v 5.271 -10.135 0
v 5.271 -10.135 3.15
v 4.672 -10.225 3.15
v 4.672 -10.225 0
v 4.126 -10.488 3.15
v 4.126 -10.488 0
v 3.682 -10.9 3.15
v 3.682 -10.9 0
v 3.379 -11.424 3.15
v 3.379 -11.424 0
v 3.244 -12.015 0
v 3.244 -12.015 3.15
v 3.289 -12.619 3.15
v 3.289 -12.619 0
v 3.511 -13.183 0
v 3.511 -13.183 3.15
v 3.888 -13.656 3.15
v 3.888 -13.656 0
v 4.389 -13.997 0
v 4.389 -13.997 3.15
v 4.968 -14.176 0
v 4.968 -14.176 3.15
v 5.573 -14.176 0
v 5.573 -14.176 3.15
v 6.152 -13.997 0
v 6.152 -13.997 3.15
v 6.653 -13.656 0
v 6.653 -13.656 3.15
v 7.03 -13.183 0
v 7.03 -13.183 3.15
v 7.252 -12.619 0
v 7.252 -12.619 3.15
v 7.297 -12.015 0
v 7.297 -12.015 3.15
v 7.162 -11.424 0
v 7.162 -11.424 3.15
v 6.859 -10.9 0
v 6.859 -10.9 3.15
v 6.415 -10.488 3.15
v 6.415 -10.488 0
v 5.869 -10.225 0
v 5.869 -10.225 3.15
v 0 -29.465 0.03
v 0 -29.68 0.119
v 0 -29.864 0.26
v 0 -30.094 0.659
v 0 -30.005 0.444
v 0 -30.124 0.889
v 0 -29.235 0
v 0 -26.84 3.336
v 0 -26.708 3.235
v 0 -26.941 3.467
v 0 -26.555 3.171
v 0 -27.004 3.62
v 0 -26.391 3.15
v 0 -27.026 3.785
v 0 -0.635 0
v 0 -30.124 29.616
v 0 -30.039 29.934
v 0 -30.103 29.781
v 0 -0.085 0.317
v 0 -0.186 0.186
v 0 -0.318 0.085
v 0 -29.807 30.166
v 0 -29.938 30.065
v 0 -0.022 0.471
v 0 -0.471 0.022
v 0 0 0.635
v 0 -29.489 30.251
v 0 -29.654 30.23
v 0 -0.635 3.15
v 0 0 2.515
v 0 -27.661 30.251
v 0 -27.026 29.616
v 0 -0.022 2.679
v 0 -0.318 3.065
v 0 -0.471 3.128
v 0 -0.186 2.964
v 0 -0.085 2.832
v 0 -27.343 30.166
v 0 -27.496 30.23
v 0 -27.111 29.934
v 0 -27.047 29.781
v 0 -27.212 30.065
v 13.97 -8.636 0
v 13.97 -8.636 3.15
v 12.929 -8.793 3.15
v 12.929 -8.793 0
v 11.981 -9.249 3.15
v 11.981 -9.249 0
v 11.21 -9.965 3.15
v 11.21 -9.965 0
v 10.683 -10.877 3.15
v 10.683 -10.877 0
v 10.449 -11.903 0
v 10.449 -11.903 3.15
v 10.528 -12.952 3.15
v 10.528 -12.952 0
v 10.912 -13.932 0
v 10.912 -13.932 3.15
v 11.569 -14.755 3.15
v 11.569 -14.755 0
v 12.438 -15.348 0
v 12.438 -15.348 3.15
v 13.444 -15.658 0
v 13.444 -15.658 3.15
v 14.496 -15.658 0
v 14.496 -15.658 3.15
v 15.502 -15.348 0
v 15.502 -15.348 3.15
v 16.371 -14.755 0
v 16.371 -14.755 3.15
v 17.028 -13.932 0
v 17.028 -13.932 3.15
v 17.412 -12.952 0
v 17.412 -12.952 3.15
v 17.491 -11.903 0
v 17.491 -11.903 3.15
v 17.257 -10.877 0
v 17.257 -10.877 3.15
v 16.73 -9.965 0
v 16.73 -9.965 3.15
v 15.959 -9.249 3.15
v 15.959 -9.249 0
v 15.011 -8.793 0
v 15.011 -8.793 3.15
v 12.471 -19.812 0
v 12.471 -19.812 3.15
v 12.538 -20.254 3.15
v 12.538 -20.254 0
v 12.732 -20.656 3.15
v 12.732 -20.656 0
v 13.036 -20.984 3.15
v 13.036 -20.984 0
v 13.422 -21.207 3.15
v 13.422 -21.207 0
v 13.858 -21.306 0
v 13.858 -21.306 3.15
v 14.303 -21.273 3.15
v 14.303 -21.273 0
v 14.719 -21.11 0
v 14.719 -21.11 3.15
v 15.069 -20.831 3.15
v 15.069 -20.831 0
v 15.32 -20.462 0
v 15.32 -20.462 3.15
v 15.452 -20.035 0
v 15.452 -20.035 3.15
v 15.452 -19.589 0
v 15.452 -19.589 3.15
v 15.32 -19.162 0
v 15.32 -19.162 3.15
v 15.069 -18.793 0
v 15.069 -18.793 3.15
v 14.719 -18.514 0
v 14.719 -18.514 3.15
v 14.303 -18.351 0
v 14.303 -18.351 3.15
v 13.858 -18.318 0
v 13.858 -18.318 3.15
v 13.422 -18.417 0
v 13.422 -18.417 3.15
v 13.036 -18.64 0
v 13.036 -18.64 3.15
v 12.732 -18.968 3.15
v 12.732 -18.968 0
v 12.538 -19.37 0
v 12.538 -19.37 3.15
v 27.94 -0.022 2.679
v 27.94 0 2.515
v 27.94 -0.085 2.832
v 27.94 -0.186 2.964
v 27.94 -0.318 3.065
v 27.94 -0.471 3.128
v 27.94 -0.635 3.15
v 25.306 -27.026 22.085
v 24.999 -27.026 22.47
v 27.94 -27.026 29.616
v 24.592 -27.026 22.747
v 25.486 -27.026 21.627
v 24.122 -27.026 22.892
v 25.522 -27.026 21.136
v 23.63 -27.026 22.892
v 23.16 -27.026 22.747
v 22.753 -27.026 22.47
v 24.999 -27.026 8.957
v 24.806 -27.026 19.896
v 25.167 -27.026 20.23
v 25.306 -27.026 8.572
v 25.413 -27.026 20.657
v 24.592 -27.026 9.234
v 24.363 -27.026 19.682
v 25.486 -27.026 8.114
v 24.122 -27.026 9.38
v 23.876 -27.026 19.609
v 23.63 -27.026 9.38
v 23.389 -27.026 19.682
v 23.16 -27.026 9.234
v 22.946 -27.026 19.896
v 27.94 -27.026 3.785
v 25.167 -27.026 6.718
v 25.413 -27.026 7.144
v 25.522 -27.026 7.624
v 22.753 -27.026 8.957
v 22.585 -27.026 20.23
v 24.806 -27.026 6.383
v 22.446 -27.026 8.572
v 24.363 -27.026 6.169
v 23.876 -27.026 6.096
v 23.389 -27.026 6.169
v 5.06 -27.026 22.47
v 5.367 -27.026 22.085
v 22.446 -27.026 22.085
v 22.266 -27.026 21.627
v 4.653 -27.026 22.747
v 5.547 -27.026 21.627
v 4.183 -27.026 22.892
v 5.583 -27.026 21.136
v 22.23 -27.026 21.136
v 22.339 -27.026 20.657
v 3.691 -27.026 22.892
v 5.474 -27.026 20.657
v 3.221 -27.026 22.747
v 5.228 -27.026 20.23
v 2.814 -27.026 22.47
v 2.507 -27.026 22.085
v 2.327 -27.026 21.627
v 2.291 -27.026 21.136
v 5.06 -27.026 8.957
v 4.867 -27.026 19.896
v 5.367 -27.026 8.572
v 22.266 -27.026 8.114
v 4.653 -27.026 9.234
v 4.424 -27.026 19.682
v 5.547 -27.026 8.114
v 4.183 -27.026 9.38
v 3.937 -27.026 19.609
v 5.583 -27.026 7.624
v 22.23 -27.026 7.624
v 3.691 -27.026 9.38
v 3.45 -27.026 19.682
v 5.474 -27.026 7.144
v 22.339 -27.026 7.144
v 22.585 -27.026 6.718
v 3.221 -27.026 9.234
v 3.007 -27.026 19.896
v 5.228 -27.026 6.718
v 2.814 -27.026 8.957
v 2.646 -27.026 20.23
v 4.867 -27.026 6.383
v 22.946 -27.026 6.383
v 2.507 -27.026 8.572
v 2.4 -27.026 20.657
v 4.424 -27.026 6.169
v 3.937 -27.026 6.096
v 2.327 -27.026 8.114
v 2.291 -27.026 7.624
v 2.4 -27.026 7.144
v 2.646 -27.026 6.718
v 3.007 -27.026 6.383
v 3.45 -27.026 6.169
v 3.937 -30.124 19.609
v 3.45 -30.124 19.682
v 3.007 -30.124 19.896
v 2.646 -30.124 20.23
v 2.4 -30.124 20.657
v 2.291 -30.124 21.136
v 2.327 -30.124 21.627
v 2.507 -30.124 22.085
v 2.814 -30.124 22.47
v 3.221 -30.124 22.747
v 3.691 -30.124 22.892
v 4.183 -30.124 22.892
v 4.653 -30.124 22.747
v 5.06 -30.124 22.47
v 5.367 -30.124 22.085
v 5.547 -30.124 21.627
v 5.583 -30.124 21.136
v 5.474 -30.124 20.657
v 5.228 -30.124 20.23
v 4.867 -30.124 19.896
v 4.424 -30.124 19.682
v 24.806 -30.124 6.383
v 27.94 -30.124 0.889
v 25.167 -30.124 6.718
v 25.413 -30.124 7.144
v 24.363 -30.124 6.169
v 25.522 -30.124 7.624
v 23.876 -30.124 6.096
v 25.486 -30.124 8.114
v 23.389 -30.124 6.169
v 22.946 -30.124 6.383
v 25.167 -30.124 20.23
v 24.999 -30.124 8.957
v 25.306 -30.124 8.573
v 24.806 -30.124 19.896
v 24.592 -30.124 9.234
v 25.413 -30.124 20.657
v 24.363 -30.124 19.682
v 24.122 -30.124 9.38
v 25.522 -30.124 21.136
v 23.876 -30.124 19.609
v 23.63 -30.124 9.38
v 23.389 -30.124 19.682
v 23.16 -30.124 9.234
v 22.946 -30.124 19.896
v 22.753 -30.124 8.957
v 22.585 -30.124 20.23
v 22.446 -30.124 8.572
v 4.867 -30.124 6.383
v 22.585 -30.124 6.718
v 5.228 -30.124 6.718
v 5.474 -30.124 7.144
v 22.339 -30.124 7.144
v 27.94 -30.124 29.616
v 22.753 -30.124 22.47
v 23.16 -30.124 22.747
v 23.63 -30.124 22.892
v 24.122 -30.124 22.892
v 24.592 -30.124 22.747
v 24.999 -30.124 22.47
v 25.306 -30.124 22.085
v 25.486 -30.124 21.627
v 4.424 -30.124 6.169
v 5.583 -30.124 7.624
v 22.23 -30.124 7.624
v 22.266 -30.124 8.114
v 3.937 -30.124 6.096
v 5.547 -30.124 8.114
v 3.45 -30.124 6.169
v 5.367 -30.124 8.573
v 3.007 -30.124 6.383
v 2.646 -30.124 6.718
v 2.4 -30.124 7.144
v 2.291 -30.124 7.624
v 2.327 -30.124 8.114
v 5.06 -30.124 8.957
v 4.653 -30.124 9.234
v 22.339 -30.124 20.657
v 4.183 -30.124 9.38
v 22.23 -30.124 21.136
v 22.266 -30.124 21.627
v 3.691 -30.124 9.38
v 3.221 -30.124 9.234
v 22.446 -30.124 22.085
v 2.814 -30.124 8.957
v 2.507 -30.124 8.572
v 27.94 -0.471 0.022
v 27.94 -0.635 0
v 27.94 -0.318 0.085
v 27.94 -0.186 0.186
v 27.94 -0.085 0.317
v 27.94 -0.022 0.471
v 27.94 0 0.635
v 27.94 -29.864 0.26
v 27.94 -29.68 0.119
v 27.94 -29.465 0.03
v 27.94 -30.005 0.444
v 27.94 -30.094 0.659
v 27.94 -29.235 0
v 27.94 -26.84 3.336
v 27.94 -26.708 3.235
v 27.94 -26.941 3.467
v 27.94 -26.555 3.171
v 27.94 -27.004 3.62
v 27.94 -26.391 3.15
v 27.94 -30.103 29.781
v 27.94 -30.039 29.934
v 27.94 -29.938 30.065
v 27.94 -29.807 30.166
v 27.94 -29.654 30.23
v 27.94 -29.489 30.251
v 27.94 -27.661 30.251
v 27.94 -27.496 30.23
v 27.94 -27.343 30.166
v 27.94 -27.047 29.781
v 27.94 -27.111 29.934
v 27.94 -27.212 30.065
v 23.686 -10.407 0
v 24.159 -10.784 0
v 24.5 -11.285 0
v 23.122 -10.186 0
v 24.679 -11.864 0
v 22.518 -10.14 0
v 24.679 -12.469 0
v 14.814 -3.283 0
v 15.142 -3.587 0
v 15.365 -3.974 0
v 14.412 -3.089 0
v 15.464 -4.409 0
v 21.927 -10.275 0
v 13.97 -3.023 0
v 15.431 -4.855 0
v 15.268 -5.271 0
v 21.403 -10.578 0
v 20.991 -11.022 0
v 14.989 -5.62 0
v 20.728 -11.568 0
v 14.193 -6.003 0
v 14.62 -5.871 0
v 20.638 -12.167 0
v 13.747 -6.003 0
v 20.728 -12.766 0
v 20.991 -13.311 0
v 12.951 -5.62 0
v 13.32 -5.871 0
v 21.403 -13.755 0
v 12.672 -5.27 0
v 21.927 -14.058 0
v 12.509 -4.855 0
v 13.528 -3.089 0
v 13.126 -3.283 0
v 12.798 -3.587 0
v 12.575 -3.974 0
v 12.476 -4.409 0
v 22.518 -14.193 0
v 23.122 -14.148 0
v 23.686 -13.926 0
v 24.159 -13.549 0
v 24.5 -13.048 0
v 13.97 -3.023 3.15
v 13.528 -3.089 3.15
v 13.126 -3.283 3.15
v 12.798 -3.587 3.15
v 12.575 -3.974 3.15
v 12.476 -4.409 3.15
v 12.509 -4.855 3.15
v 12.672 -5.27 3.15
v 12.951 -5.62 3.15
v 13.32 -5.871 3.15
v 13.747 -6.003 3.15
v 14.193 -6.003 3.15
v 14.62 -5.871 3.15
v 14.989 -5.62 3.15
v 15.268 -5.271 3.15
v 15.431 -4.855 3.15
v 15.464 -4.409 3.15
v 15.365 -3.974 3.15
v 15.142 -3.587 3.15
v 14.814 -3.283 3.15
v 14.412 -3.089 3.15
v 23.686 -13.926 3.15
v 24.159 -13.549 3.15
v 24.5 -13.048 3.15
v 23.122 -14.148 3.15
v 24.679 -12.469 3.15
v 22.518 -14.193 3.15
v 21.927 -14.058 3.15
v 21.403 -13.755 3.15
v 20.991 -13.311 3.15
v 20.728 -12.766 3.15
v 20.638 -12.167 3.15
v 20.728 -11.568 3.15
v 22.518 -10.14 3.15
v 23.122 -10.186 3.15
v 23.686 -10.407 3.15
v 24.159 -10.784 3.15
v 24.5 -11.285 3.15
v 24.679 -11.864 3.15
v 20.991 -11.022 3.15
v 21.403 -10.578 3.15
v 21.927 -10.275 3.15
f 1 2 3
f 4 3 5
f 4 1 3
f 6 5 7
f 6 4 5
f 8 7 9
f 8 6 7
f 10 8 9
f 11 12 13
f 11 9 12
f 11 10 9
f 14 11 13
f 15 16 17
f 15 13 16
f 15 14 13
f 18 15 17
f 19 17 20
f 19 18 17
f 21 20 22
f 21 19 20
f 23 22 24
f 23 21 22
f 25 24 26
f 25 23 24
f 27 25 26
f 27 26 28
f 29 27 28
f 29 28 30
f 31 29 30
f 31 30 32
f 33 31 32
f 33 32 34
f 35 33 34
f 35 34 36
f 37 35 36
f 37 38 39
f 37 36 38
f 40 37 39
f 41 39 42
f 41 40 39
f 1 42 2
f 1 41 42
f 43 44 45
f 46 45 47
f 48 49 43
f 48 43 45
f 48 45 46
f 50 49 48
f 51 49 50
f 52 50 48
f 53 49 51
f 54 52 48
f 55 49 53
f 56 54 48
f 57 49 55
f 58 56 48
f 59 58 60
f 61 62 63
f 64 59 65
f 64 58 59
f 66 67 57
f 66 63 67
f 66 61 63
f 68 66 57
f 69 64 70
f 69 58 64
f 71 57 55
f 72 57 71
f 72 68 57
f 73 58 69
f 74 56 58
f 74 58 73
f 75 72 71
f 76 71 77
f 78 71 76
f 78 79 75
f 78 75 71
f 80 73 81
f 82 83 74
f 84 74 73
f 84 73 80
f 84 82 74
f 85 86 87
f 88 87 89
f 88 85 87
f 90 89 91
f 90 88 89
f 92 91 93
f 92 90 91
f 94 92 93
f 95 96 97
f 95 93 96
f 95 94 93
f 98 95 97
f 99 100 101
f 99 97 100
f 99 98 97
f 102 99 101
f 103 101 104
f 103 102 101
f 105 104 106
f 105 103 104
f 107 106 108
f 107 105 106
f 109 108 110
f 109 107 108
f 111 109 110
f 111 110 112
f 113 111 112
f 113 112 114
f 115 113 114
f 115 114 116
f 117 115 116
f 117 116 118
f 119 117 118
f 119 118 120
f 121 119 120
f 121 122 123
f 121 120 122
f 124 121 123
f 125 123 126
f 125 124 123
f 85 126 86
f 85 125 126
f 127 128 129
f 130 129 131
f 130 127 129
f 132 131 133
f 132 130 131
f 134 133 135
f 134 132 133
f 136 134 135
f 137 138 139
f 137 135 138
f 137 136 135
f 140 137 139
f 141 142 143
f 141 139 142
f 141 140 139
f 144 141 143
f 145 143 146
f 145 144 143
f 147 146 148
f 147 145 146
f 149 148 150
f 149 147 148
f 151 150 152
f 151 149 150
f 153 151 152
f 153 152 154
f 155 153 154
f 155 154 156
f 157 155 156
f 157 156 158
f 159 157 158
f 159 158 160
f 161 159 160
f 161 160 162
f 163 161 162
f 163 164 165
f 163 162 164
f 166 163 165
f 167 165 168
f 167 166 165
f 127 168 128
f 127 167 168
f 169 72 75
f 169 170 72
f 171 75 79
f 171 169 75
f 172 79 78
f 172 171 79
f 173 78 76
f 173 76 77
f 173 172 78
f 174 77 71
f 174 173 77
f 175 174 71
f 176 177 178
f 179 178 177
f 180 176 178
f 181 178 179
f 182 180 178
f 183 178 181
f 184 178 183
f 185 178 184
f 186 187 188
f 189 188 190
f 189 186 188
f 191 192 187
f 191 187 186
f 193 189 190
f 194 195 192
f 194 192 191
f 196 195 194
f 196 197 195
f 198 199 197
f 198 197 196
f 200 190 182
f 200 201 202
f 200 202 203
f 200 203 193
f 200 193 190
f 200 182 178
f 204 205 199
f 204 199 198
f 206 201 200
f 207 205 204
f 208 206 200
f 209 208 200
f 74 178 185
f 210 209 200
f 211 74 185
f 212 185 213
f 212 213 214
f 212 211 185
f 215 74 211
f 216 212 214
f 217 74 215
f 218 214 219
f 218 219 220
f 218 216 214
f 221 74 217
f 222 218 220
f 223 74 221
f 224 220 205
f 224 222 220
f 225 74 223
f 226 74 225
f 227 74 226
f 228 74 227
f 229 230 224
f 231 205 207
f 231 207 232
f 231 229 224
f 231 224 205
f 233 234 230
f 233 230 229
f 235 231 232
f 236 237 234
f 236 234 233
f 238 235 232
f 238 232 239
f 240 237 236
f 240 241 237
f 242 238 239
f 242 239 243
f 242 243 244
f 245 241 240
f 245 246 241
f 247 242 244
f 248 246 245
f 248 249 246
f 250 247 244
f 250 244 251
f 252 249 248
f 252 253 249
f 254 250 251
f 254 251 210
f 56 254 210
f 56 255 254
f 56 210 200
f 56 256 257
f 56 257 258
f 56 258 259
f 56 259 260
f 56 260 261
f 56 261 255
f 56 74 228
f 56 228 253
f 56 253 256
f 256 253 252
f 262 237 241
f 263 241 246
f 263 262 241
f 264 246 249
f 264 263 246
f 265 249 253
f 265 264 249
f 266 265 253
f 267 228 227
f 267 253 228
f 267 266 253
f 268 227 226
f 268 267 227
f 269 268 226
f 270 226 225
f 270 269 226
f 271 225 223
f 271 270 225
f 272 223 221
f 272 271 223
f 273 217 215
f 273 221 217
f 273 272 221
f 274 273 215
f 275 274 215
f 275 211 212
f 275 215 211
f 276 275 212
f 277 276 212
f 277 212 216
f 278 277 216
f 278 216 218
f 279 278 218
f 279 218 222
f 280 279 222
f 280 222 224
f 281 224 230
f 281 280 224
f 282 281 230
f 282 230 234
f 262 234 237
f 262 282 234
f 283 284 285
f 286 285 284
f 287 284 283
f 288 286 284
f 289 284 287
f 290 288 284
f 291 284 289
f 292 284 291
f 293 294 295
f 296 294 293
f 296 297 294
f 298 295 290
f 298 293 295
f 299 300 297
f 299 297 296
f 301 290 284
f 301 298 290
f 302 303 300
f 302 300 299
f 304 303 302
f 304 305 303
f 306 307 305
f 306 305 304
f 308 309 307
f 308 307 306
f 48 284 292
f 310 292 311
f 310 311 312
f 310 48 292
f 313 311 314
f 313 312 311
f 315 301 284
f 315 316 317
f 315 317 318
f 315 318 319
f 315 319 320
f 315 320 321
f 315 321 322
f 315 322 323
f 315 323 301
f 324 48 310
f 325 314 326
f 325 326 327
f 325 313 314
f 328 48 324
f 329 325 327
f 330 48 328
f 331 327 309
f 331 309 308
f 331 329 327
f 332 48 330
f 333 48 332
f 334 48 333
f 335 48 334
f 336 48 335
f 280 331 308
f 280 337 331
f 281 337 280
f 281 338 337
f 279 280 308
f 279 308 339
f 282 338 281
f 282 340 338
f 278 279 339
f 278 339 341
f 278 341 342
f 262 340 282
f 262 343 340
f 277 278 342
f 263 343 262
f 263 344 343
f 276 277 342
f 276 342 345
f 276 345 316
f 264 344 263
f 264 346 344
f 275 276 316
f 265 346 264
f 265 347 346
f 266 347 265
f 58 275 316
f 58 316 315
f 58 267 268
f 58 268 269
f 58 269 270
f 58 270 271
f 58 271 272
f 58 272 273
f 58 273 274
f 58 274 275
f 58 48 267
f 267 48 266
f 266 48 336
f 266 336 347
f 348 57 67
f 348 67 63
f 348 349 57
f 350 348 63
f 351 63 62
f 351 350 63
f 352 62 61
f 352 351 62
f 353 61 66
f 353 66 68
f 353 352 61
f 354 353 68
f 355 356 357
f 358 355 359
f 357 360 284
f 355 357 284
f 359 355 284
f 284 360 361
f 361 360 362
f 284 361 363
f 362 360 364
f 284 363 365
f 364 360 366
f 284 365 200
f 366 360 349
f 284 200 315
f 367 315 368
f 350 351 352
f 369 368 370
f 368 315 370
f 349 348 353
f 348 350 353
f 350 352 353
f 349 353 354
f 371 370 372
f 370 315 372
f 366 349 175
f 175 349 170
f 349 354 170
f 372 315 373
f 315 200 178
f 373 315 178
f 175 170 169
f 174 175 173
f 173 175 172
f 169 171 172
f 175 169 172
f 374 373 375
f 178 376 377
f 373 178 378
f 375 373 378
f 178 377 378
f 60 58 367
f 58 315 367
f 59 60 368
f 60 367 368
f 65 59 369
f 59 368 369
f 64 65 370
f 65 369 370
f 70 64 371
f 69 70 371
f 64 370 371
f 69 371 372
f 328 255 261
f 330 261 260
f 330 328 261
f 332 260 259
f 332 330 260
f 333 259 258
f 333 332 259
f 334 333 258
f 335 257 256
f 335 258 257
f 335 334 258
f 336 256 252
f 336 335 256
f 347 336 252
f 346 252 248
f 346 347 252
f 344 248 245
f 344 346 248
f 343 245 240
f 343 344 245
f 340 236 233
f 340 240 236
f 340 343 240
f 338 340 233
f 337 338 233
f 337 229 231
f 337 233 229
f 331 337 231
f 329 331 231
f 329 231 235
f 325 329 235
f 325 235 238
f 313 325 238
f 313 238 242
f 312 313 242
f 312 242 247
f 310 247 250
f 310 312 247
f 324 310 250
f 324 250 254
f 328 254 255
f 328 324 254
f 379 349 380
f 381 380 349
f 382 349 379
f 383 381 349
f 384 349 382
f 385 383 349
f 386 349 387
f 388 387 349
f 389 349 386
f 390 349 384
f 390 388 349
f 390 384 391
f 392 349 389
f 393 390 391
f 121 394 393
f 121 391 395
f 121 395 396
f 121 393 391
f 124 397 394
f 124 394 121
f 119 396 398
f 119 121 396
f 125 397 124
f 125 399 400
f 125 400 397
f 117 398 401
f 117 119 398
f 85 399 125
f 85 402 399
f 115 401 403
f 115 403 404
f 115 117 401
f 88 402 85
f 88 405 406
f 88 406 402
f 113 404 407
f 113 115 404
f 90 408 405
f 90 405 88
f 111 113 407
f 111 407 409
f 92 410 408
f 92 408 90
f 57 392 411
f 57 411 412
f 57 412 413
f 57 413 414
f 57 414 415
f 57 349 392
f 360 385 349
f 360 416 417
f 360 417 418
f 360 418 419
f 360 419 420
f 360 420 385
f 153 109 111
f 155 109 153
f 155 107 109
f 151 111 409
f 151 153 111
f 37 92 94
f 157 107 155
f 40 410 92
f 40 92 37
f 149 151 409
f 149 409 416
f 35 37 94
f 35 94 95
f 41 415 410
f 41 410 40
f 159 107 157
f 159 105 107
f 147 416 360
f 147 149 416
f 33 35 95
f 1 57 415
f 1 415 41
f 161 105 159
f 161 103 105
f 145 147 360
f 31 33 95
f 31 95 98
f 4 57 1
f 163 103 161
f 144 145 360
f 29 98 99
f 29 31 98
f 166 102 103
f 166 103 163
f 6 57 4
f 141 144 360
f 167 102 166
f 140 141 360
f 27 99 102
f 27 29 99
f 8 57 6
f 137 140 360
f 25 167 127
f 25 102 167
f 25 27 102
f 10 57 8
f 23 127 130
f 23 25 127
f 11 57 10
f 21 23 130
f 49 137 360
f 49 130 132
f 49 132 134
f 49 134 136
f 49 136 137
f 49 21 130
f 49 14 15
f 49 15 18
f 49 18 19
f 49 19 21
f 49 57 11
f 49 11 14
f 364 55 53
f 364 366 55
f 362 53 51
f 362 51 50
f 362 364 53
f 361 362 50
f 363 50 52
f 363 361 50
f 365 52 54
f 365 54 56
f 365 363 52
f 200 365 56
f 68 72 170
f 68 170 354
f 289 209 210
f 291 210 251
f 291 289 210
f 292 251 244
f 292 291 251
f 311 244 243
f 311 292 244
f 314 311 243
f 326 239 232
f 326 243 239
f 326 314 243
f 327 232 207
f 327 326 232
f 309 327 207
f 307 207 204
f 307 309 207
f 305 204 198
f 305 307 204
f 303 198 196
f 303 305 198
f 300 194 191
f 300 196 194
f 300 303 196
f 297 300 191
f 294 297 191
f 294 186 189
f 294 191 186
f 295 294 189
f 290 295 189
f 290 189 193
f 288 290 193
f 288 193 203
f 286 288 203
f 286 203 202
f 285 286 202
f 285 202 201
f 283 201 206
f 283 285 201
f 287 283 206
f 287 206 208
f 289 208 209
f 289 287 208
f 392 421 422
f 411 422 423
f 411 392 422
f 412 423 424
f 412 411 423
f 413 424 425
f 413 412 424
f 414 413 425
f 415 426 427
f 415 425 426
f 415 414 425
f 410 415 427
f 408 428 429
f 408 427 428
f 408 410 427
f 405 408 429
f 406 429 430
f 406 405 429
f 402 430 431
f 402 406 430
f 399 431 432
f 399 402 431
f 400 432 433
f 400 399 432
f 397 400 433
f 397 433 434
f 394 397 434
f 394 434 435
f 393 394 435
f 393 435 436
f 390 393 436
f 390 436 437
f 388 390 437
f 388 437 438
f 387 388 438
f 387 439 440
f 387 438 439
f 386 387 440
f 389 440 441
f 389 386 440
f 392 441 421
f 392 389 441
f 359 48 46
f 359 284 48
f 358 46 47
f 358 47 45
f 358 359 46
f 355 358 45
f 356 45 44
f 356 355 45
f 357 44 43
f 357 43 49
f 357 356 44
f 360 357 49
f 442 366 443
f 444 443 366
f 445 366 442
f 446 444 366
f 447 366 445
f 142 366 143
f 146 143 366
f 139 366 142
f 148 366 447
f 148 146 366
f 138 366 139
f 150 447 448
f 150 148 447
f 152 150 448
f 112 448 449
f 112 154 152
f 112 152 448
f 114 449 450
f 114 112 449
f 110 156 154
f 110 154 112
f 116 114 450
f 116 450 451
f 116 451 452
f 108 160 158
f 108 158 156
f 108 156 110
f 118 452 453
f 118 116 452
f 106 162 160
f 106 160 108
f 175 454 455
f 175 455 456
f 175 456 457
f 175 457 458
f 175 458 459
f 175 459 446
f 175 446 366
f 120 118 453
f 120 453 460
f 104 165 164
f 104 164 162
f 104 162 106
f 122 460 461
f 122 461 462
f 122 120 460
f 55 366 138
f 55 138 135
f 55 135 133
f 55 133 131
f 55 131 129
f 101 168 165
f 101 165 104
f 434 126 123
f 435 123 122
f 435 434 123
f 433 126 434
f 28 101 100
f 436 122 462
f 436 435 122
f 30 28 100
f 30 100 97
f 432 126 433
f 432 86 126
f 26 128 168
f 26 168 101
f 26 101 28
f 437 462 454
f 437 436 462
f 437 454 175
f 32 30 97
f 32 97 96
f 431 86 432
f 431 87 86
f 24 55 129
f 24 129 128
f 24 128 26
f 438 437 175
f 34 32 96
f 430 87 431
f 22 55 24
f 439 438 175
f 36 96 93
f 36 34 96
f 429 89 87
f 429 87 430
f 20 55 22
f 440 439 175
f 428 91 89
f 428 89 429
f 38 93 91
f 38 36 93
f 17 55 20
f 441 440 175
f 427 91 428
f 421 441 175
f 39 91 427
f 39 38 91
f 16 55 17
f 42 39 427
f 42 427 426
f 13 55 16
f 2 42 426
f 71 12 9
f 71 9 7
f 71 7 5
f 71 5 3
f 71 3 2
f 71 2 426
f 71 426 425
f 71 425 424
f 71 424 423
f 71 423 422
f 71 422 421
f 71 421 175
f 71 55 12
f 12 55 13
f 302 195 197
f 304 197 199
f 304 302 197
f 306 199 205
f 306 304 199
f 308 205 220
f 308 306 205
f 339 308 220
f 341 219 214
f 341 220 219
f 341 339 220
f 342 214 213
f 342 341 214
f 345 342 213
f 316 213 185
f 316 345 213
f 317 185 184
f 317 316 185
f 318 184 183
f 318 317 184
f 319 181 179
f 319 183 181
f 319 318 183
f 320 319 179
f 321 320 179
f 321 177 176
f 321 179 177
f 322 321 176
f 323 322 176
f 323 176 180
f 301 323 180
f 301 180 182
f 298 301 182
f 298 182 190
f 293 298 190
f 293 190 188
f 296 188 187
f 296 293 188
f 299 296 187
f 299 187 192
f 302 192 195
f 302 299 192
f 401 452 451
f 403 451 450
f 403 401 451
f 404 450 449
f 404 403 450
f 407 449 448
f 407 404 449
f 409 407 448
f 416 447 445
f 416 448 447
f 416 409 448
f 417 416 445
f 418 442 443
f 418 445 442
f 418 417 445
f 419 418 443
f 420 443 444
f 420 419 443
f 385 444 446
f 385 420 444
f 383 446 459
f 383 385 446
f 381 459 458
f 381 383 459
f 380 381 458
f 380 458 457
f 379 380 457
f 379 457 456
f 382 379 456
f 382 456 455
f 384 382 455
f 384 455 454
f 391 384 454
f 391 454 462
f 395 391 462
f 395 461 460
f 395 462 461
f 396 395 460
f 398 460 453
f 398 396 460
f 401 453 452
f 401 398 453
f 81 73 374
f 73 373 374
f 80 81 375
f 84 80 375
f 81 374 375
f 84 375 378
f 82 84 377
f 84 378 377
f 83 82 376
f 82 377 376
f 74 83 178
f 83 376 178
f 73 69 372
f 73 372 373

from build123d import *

# Parameters (mm, degrees)
BOSS_EXTRUDE1_DEPTH     = 27.94
SKETCH2_R               = 3.5306
SKETCH2_R_2             = 1.4986
SKETCH2_R_3             = 2.032
MOTOR_MOUNT_HOLES_DEPTH = 52.022252766
SKETCH3_R               = 1.651
PLATE_MOUNT_HOLES_DEPTH = 52.022252766
FILLET1_R               = 0.635
FILLET2_R               = 0.889
FILLET3_R               = 0.635


with BuildPart() as part:
    # Sketch1 → Boss-Extrude1 (new body)
    with BuildSketch(Plane(origin=(0, 0, 0), x_dir=(0, 0, -1), z_dir=(1, 0, 0))):
        Polygon((0, 0), (0, -30.1244), (-30.2514, -30.1244), (-30.2514, -27.0256), (-3.1496, -27.0256), (-3.1496, 0), align=None)
    extrude(amount=BOSS_EXTRUDE1_DEPTH)

    # Sketch2 → Motor_Mount_holes (cut, through all)
    with BuildSketch(Plane.XY):
        with Locations(Location((13.97, -12.1666, 0), (0, 0, 90))):
            Circle(SKETCH2_R)
        with Locations(Location((13.97, -4.5212, 0), (0, 0, 90))):
            Circle(SKETCH2_R_2)
        with Locations(Location((5.2705, -12.1666, 0), (0, 0, 90))):
            Circle(SKETCH2_R_3)
        with Locations(Location((22.6695, -12.1666, 0), (0, 0, 180))):
            Circle(SKETCH2_R_3)
        with Locations(Location((13.97, -19.812, 0), (0, 0, 180))):
            Circle(SKETCH2_R_2)
    extrude(amount=MOTOR_MOUNT_HOLES_DEPTH, mode=Mode.SUBTRACT)

    # Sketch3 → Plate_Mount_Holes (cut, through all)
    with BuildSketch(Plane(origin=(0, -30.1244, 0), x_dir=(1, 0, 0), z_dir=(0, 1, 0))):
        with Locations(Location((3.937, -7.747, 0), (0, 0, 90))):
            Circle(SKETCH3_R)
        with Locations(Location((23.876, -7.747, 0), (0, 0, 90))):
            Circle(SKETCH3_R)
        with Locations(Location((3.937, -21.2598, 0), (0, 0, 90))):
            Circle(SKETCH3_R)
        with Locations(Location((23.876, -21.2598, 0), (0, 0, 90))):
            Circle(SKETCH3_R)
    extrude(amount=PLATE_MOUNT_HOLES_DEPTH, mode=Mode.SUBTRACT)

    # Fillet1
    fillet1_edges = [part.edges().sort_by_distance(p)[0] for p in [
        (13.97, -27.0256, 3.1496),
    ]]
    fillet(fillet1_edges, radius=FILLET1_R)

    # Fillet2
    fillet2_edges = [part.edges().sort_by_distance(p)[0] for p in [
        (13.97, -30.1244, 0),
    ]]
    fillet(fillet2_edges, radius=FILLET2_R)

    # Fillet3
    fillet3_edges = [part.edges().sort_by_distance(p)[0] for p in [
        (13.97, 0, 0),
        (13.97, -30.1244, 30.2514),
        (13.97, -27.0256, 30.2514),
        (13.97, 0, 3.1496),
    ]]
    fillet(fillet3_edges, radius=FILLET3_R)


solid = part.part
